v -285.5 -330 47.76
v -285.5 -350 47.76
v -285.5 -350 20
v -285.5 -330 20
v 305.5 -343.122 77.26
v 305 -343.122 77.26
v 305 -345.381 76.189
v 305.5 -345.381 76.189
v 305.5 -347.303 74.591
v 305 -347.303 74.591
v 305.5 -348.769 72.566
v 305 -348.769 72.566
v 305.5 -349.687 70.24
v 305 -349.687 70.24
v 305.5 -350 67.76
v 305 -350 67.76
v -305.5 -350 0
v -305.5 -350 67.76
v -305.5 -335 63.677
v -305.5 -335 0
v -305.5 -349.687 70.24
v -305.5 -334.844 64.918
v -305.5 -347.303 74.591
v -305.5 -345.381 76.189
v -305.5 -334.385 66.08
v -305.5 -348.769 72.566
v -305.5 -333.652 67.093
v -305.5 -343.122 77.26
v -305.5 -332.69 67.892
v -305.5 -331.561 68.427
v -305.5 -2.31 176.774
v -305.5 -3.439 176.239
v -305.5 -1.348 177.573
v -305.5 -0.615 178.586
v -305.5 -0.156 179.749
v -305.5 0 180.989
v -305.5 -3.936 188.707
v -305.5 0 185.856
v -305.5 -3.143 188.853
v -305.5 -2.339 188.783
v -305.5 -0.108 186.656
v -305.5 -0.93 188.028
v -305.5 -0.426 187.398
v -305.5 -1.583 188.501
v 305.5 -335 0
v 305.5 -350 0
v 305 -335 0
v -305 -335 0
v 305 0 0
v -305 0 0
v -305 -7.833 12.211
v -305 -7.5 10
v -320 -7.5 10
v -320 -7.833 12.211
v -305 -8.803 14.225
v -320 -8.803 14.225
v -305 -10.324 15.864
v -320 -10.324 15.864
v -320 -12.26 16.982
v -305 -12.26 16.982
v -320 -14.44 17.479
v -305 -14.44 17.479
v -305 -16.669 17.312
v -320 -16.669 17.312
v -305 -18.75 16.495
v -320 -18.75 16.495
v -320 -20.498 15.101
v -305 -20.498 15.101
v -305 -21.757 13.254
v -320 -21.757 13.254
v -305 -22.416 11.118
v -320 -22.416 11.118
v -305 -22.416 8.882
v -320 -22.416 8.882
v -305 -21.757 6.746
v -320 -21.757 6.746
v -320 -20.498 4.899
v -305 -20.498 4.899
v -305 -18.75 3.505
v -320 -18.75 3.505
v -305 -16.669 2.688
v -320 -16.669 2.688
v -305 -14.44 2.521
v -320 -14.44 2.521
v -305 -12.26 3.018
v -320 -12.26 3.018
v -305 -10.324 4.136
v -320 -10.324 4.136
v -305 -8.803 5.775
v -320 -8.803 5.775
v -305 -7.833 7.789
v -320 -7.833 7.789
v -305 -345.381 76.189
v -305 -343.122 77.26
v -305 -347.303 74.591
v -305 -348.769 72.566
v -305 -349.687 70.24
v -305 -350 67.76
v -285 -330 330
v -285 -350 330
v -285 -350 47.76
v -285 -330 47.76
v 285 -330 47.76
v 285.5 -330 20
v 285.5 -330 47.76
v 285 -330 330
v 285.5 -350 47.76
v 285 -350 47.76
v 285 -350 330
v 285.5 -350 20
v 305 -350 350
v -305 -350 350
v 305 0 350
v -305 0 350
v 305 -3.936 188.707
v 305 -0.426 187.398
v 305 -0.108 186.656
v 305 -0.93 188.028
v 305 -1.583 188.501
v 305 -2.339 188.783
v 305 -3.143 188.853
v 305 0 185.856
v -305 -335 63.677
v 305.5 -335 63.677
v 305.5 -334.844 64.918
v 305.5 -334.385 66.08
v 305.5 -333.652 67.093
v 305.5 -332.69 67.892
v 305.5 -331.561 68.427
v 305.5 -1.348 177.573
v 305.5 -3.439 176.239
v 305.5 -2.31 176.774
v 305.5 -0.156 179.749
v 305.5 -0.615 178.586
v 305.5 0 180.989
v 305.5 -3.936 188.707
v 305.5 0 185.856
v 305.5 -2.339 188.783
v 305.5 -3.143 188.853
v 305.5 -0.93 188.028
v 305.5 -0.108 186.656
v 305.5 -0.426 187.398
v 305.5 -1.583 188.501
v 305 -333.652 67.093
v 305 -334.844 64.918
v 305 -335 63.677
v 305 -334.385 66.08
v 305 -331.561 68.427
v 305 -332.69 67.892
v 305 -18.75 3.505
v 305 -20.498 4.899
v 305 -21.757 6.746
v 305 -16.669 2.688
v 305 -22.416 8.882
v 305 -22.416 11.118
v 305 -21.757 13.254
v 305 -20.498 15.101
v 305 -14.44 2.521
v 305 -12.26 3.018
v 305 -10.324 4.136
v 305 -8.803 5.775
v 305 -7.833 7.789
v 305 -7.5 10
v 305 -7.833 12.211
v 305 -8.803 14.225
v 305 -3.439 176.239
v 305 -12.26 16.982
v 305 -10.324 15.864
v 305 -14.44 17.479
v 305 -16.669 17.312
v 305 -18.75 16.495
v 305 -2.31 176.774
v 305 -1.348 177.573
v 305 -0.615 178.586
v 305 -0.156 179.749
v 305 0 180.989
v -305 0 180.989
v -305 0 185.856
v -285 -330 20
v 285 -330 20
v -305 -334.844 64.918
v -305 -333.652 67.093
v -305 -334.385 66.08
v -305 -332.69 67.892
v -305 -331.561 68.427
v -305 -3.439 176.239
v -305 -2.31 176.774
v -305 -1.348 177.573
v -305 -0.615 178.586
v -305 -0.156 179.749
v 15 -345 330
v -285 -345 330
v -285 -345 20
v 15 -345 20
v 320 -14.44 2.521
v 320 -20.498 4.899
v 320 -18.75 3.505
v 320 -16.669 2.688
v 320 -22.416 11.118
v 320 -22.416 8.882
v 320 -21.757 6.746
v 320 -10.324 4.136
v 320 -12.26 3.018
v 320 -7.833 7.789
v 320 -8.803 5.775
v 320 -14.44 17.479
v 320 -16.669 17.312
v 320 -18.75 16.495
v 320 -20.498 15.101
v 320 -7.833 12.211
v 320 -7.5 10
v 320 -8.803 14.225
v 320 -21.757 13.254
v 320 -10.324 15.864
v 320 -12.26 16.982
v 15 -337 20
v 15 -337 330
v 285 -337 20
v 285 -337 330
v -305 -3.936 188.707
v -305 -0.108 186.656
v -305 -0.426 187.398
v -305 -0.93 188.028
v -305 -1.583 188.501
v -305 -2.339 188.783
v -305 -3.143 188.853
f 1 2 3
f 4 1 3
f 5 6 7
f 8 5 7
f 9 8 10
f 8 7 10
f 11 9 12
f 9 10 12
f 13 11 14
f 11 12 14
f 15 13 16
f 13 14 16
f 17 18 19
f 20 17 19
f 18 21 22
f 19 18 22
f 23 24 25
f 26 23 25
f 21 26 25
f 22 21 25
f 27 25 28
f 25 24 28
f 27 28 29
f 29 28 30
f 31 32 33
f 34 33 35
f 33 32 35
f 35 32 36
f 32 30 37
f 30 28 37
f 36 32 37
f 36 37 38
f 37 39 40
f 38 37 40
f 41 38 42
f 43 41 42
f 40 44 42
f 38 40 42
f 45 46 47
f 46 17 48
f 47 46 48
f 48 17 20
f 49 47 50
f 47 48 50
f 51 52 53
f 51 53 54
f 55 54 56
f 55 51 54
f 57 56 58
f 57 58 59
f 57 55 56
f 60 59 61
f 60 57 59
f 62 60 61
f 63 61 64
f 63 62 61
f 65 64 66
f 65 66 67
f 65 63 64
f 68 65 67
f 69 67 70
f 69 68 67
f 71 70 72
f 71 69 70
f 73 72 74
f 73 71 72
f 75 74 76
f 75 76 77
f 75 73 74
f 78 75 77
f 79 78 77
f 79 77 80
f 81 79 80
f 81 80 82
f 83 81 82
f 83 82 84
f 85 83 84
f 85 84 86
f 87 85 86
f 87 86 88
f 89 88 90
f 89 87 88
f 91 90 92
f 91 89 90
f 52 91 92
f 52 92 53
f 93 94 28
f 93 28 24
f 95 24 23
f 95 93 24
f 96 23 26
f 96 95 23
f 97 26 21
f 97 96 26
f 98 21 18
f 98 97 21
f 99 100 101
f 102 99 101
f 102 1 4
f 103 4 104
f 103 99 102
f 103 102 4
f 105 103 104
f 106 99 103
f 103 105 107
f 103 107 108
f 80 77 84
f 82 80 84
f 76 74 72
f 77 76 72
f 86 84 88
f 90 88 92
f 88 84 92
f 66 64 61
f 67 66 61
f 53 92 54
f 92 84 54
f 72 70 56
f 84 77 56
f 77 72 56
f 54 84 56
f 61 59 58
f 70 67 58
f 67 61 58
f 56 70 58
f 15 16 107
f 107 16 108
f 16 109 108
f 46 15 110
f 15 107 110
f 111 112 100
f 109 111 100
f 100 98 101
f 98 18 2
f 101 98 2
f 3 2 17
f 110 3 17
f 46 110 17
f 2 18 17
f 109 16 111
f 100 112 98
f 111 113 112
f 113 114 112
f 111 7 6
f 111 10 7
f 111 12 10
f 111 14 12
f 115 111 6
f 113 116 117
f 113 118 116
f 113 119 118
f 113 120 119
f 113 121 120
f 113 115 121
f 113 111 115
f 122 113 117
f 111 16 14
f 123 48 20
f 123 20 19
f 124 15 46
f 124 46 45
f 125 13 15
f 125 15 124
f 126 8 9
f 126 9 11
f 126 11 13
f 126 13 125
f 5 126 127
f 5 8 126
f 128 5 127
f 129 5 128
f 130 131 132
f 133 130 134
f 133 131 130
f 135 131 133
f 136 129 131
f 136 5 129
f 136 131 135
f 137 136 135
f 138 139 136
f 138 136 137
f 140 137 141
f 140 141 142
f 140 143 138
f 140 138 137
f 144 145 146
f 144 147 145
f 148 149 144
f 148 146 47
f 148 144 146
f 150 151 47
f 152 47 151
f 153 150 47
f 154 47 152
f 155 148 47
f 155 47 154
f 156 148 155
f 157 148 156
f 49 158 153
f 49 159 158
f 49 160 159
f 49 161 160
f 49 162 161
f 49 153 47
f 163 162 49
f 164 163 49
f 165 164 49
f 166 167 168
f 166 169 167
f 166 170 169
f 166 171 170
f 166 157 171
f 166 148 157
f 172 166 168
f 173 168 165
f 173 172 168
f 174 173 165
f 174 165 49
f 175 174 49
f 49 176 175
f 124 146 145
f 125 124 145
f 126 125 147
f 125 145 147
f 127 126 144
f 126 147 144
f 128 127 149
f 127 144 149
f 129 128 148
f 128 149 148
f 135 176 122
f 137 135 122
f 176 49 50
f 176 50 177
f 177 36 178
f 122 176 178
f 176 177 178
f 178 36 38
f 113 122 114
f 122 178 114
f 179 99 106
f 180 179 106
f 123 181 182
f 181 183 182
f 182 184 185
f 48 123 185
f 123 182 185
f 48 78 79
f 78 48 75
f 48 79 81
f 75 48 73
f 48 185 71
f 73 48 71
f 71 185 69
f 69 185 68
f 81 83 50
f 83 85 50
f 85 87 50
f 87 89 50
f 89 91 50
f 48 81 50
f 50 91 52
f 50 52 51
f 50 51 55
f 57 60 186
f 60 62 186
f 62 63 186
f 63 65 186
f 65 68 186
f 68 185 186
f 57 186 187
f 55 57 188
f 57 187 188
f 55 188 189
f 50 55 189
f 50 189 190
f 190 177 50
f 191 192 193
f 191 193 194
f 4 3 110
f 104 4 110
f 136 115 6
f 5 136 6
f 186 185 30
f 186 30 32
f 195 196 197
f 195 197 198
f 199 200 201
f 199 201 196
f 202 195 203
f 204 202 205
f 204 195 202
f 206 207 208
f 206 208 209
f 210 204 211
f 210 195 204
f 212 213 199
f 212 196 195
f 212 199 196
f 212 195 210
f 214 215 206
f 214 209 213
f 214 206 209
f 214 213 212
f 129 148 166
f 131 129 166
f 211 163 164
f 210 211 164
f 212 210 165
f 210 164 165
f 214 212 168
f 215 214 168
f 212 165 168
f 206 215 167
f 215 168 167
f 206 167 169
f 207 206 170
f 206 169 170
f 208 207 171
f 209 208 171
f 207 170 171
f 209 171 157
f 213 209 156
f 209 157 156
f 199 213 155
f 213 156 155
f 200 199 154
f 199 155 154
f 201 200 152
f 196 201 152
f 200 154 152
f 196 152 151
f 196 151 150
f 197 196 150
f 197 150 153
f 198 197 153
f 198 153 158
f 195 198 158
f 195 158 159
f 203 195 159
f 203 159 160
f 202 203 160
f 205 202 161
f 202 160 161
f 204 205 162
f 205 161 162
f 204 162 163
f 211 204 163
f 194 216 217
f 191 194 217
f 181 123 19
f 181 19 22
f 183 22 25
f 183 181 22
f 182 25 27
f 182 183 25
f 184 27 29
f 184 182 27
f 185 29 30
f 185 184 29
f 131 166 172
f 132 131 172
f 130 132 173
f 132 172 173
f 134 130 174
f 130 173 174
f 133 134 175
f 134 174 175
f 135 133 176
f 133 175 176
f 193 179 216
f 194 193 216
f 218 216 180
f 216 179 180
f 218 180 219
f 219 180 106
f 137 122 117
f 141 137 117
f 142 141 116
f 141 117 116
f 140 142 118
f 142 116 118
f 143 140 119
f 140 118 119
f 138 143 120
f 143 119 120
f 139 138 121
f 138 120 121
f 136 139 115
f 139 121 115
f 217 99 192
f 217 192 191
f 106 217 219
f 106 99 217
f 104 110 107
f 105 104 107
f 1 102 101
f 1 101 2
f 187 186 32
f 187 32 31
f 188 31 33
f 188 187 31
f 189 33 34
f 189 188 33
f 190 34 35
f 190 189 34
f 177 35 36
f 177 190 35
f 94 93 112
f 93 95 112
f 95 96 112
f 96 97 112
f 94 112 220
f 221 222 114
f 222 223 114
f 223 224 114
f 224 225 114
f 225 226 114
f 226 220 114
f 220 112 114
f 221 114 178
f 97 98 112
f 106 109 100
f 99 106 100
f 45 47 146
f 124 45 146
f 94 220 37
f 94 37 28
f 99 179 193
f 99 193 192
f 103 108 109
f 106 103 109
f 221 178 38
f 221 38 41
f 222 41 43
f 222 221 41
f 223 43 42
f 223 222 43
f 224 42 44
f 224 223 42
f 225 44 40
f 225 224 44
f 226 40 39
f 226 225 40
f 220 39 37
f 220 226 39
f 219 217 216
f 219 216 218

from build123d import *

# Parameters (mm, degrees)
F1_DEPTH  = 305
F3_DEPTH  = 0.5
F4_R      = 7.5
F5_DEPTH  = 15
F9_DEPTH  = 20
F10_W     = 300
F10_H     = 310.0000008941
F11_DEPTH = 15
F12_W     = 300
F12_H     = 310.0000008941
F13_DEPTH = 7


with BuildPart() as f1:
    # F0 (on Right) → F1 (new body)
    with BuildSketch(Plane.YZ):
        with BuildLine():
            Line((-335, 0), (0, 0))
            Line((0, 0), (0, 180.9889680492))
            ThreePointArc((0, 180.9889680492), (-0.9500720856, 178.0567191021), (-3.4392335551, 176.238809304))
            Line((-3.4392335551, 176.238809304), (-331.5607664449, 68.4274484974))
            ThreePointArc((-331.5607664449, 68.4274484974), (-334.0499279144, 66.6095386993), (-335, 63.6772897522))
            Line((-335, 63.6772897522), (-335, 0))
        make_face()
        with BuildLine():
            Line((-350, 0), (-335, 0))
            Line((-335, 0), (-335, 63.6772897522))
            ThreePointArc((-335, 63.6772897522), (-334.0499279144, 66.6095386993), (-331.5607664449, 68.4274484974))
            Line((-331.5607664449, 68.4274484974), (-3.4392335551, 176.238809304))
            ThreePointArc((-3.4392335551, 176.238809304), (-0.9500720856, 178.0567191021), (0, 180.9889680492))
            Line((0, 180.9889680492), (0, 185.8564965109))
            ThreePointArc((0, 185.8564965109), (-1.2406506317, 188.2864532596), (-3.9364598669, 188.706591758))
            Line((-3.9364598669, 188.706591758), (-343.1215328897, 77.2600677648))
            ThreePointArc((-343.1215328897, 77.2600677648), (-348.0998558289, 73.6242481686), (-350, 67.7597502744))
            Line((-350, 67.7597502744), (-350, 0))
        make_face()
        with BuildLine():
            ThreePointArc((-3.9364598669, 188.706591758), (-1.2406506317, 188.2864532596), (0, 185.8564965109))
            Line((0, 185.8564965109), (0, 350))
            Line((0, 350), (-350, 350))
            Line((-350, 350), (-350, 67.7597502744))
            ThreePointArc((-350, 67.7597502744), (-348.0998558289, 73.6242481686), (-343.1215328897, 77.2600677648))
            Line((-343.1215328897, 77.2600677648), (-3.9364598669, 188.706591758))
        make_face()
    extrude(amount=F1_DEPTH)

    # F4 (on face) → F5 (join)
    with BuildSketch(Plane.YZ.offset(305)):
        with Locations((-15, 10)):
            Circle(F4_R)
    extrude(amount=F5_DEPTH)


with BuildPart() as f3:
    # F2 (on face) → F3 (new body)
    with BuildSketch(Plane.YZ.offset(305)):
        with BuildLine():
            ThreePointArc((0, 185.8564965109), (-1.2406506317, 188.2864532596), (-3.9364598669, 188.706591758))
            Line((-3.9364598669, 188.706591758), (-343.1215328897, 77.2600677648))
            ThreePointArc((-343.1215328897, 77.2600677648), (-348.0998558289, 73.6242481686), (-350, 67.7597502744))
            Line((-350, 67.7597502744), (-350, 0))
            Line((-350, 0), (-335, 0))
            Line((-335, 0), (-335, 63.6772897522))
            ThreePointArc((-335, 63.6772897522), (-334.0499279144, 66.6095386993), (-331.5607664449, 68.4274484974))
            Line((-331.5607664449, 68.4274484974), (-3.4392335551, 176.238809304))
            ThreePointArc((-3.4392335551, 176.238809304), (-0.9500720856, 178.0567191021), (0, 180.9889680492))
            Line((0, 180.9889680492), (0, 185.8564965109))
        make_face()
    extrude(amount=F3_DEPTH)


with BuildPart() as f6_1:
    # F6: instance of F1
    add(f1.part.mirror(Plane.YZ))


with BuildPart() as f6_2:
    # F6: instance of F3
    add(f3.part.mirror(Plane.YZ))


with BuildPart() as f6_1_1:
    add(f6_1.part)

    # F7: union F1, F6_2, F3
    add(f1.part)
    add(f6_2.part)
    add(f3.part)

    # F8 (on face) → F9 (cut)
    with BuildSketch(Plane.XZ.offset(350)):
        Polygon((-285.000000447, 47.7597507214), (-285.500000447, 47.7597507214), (-285.500000447, 19.999999553), (285.500000447, 19.999999553), (285.500000447, 47.7597507214), (285.000000447, 47.7597507214), (285.000000447, 330.000000447), (-285.000000447, 330.000000447), align=None)
    extrude(amount=-F9_DEPTH, mode=Mode.SUBTRACT)


with BuildPart() as f11:
    # F10 (on face) → F11 (new body)
    with BuildSketch(Plane.XZ.offset(330)):
        with Locations((-135.000000447, 175)):
            Rectangle(F10_W, F10_H)
    extrude(amount=F11_DEPTH)

    # F12 (on face) → F13 (join)
    with BuildSketch(Plane.XZ.offset(330)):
        with Locations((135.000000447, 175)):
            Rectangle(F12_W, F12_H)
    extrude(amount=F13_DEPTH)


solid = Compound([f6_1_1.part, f11.part])
